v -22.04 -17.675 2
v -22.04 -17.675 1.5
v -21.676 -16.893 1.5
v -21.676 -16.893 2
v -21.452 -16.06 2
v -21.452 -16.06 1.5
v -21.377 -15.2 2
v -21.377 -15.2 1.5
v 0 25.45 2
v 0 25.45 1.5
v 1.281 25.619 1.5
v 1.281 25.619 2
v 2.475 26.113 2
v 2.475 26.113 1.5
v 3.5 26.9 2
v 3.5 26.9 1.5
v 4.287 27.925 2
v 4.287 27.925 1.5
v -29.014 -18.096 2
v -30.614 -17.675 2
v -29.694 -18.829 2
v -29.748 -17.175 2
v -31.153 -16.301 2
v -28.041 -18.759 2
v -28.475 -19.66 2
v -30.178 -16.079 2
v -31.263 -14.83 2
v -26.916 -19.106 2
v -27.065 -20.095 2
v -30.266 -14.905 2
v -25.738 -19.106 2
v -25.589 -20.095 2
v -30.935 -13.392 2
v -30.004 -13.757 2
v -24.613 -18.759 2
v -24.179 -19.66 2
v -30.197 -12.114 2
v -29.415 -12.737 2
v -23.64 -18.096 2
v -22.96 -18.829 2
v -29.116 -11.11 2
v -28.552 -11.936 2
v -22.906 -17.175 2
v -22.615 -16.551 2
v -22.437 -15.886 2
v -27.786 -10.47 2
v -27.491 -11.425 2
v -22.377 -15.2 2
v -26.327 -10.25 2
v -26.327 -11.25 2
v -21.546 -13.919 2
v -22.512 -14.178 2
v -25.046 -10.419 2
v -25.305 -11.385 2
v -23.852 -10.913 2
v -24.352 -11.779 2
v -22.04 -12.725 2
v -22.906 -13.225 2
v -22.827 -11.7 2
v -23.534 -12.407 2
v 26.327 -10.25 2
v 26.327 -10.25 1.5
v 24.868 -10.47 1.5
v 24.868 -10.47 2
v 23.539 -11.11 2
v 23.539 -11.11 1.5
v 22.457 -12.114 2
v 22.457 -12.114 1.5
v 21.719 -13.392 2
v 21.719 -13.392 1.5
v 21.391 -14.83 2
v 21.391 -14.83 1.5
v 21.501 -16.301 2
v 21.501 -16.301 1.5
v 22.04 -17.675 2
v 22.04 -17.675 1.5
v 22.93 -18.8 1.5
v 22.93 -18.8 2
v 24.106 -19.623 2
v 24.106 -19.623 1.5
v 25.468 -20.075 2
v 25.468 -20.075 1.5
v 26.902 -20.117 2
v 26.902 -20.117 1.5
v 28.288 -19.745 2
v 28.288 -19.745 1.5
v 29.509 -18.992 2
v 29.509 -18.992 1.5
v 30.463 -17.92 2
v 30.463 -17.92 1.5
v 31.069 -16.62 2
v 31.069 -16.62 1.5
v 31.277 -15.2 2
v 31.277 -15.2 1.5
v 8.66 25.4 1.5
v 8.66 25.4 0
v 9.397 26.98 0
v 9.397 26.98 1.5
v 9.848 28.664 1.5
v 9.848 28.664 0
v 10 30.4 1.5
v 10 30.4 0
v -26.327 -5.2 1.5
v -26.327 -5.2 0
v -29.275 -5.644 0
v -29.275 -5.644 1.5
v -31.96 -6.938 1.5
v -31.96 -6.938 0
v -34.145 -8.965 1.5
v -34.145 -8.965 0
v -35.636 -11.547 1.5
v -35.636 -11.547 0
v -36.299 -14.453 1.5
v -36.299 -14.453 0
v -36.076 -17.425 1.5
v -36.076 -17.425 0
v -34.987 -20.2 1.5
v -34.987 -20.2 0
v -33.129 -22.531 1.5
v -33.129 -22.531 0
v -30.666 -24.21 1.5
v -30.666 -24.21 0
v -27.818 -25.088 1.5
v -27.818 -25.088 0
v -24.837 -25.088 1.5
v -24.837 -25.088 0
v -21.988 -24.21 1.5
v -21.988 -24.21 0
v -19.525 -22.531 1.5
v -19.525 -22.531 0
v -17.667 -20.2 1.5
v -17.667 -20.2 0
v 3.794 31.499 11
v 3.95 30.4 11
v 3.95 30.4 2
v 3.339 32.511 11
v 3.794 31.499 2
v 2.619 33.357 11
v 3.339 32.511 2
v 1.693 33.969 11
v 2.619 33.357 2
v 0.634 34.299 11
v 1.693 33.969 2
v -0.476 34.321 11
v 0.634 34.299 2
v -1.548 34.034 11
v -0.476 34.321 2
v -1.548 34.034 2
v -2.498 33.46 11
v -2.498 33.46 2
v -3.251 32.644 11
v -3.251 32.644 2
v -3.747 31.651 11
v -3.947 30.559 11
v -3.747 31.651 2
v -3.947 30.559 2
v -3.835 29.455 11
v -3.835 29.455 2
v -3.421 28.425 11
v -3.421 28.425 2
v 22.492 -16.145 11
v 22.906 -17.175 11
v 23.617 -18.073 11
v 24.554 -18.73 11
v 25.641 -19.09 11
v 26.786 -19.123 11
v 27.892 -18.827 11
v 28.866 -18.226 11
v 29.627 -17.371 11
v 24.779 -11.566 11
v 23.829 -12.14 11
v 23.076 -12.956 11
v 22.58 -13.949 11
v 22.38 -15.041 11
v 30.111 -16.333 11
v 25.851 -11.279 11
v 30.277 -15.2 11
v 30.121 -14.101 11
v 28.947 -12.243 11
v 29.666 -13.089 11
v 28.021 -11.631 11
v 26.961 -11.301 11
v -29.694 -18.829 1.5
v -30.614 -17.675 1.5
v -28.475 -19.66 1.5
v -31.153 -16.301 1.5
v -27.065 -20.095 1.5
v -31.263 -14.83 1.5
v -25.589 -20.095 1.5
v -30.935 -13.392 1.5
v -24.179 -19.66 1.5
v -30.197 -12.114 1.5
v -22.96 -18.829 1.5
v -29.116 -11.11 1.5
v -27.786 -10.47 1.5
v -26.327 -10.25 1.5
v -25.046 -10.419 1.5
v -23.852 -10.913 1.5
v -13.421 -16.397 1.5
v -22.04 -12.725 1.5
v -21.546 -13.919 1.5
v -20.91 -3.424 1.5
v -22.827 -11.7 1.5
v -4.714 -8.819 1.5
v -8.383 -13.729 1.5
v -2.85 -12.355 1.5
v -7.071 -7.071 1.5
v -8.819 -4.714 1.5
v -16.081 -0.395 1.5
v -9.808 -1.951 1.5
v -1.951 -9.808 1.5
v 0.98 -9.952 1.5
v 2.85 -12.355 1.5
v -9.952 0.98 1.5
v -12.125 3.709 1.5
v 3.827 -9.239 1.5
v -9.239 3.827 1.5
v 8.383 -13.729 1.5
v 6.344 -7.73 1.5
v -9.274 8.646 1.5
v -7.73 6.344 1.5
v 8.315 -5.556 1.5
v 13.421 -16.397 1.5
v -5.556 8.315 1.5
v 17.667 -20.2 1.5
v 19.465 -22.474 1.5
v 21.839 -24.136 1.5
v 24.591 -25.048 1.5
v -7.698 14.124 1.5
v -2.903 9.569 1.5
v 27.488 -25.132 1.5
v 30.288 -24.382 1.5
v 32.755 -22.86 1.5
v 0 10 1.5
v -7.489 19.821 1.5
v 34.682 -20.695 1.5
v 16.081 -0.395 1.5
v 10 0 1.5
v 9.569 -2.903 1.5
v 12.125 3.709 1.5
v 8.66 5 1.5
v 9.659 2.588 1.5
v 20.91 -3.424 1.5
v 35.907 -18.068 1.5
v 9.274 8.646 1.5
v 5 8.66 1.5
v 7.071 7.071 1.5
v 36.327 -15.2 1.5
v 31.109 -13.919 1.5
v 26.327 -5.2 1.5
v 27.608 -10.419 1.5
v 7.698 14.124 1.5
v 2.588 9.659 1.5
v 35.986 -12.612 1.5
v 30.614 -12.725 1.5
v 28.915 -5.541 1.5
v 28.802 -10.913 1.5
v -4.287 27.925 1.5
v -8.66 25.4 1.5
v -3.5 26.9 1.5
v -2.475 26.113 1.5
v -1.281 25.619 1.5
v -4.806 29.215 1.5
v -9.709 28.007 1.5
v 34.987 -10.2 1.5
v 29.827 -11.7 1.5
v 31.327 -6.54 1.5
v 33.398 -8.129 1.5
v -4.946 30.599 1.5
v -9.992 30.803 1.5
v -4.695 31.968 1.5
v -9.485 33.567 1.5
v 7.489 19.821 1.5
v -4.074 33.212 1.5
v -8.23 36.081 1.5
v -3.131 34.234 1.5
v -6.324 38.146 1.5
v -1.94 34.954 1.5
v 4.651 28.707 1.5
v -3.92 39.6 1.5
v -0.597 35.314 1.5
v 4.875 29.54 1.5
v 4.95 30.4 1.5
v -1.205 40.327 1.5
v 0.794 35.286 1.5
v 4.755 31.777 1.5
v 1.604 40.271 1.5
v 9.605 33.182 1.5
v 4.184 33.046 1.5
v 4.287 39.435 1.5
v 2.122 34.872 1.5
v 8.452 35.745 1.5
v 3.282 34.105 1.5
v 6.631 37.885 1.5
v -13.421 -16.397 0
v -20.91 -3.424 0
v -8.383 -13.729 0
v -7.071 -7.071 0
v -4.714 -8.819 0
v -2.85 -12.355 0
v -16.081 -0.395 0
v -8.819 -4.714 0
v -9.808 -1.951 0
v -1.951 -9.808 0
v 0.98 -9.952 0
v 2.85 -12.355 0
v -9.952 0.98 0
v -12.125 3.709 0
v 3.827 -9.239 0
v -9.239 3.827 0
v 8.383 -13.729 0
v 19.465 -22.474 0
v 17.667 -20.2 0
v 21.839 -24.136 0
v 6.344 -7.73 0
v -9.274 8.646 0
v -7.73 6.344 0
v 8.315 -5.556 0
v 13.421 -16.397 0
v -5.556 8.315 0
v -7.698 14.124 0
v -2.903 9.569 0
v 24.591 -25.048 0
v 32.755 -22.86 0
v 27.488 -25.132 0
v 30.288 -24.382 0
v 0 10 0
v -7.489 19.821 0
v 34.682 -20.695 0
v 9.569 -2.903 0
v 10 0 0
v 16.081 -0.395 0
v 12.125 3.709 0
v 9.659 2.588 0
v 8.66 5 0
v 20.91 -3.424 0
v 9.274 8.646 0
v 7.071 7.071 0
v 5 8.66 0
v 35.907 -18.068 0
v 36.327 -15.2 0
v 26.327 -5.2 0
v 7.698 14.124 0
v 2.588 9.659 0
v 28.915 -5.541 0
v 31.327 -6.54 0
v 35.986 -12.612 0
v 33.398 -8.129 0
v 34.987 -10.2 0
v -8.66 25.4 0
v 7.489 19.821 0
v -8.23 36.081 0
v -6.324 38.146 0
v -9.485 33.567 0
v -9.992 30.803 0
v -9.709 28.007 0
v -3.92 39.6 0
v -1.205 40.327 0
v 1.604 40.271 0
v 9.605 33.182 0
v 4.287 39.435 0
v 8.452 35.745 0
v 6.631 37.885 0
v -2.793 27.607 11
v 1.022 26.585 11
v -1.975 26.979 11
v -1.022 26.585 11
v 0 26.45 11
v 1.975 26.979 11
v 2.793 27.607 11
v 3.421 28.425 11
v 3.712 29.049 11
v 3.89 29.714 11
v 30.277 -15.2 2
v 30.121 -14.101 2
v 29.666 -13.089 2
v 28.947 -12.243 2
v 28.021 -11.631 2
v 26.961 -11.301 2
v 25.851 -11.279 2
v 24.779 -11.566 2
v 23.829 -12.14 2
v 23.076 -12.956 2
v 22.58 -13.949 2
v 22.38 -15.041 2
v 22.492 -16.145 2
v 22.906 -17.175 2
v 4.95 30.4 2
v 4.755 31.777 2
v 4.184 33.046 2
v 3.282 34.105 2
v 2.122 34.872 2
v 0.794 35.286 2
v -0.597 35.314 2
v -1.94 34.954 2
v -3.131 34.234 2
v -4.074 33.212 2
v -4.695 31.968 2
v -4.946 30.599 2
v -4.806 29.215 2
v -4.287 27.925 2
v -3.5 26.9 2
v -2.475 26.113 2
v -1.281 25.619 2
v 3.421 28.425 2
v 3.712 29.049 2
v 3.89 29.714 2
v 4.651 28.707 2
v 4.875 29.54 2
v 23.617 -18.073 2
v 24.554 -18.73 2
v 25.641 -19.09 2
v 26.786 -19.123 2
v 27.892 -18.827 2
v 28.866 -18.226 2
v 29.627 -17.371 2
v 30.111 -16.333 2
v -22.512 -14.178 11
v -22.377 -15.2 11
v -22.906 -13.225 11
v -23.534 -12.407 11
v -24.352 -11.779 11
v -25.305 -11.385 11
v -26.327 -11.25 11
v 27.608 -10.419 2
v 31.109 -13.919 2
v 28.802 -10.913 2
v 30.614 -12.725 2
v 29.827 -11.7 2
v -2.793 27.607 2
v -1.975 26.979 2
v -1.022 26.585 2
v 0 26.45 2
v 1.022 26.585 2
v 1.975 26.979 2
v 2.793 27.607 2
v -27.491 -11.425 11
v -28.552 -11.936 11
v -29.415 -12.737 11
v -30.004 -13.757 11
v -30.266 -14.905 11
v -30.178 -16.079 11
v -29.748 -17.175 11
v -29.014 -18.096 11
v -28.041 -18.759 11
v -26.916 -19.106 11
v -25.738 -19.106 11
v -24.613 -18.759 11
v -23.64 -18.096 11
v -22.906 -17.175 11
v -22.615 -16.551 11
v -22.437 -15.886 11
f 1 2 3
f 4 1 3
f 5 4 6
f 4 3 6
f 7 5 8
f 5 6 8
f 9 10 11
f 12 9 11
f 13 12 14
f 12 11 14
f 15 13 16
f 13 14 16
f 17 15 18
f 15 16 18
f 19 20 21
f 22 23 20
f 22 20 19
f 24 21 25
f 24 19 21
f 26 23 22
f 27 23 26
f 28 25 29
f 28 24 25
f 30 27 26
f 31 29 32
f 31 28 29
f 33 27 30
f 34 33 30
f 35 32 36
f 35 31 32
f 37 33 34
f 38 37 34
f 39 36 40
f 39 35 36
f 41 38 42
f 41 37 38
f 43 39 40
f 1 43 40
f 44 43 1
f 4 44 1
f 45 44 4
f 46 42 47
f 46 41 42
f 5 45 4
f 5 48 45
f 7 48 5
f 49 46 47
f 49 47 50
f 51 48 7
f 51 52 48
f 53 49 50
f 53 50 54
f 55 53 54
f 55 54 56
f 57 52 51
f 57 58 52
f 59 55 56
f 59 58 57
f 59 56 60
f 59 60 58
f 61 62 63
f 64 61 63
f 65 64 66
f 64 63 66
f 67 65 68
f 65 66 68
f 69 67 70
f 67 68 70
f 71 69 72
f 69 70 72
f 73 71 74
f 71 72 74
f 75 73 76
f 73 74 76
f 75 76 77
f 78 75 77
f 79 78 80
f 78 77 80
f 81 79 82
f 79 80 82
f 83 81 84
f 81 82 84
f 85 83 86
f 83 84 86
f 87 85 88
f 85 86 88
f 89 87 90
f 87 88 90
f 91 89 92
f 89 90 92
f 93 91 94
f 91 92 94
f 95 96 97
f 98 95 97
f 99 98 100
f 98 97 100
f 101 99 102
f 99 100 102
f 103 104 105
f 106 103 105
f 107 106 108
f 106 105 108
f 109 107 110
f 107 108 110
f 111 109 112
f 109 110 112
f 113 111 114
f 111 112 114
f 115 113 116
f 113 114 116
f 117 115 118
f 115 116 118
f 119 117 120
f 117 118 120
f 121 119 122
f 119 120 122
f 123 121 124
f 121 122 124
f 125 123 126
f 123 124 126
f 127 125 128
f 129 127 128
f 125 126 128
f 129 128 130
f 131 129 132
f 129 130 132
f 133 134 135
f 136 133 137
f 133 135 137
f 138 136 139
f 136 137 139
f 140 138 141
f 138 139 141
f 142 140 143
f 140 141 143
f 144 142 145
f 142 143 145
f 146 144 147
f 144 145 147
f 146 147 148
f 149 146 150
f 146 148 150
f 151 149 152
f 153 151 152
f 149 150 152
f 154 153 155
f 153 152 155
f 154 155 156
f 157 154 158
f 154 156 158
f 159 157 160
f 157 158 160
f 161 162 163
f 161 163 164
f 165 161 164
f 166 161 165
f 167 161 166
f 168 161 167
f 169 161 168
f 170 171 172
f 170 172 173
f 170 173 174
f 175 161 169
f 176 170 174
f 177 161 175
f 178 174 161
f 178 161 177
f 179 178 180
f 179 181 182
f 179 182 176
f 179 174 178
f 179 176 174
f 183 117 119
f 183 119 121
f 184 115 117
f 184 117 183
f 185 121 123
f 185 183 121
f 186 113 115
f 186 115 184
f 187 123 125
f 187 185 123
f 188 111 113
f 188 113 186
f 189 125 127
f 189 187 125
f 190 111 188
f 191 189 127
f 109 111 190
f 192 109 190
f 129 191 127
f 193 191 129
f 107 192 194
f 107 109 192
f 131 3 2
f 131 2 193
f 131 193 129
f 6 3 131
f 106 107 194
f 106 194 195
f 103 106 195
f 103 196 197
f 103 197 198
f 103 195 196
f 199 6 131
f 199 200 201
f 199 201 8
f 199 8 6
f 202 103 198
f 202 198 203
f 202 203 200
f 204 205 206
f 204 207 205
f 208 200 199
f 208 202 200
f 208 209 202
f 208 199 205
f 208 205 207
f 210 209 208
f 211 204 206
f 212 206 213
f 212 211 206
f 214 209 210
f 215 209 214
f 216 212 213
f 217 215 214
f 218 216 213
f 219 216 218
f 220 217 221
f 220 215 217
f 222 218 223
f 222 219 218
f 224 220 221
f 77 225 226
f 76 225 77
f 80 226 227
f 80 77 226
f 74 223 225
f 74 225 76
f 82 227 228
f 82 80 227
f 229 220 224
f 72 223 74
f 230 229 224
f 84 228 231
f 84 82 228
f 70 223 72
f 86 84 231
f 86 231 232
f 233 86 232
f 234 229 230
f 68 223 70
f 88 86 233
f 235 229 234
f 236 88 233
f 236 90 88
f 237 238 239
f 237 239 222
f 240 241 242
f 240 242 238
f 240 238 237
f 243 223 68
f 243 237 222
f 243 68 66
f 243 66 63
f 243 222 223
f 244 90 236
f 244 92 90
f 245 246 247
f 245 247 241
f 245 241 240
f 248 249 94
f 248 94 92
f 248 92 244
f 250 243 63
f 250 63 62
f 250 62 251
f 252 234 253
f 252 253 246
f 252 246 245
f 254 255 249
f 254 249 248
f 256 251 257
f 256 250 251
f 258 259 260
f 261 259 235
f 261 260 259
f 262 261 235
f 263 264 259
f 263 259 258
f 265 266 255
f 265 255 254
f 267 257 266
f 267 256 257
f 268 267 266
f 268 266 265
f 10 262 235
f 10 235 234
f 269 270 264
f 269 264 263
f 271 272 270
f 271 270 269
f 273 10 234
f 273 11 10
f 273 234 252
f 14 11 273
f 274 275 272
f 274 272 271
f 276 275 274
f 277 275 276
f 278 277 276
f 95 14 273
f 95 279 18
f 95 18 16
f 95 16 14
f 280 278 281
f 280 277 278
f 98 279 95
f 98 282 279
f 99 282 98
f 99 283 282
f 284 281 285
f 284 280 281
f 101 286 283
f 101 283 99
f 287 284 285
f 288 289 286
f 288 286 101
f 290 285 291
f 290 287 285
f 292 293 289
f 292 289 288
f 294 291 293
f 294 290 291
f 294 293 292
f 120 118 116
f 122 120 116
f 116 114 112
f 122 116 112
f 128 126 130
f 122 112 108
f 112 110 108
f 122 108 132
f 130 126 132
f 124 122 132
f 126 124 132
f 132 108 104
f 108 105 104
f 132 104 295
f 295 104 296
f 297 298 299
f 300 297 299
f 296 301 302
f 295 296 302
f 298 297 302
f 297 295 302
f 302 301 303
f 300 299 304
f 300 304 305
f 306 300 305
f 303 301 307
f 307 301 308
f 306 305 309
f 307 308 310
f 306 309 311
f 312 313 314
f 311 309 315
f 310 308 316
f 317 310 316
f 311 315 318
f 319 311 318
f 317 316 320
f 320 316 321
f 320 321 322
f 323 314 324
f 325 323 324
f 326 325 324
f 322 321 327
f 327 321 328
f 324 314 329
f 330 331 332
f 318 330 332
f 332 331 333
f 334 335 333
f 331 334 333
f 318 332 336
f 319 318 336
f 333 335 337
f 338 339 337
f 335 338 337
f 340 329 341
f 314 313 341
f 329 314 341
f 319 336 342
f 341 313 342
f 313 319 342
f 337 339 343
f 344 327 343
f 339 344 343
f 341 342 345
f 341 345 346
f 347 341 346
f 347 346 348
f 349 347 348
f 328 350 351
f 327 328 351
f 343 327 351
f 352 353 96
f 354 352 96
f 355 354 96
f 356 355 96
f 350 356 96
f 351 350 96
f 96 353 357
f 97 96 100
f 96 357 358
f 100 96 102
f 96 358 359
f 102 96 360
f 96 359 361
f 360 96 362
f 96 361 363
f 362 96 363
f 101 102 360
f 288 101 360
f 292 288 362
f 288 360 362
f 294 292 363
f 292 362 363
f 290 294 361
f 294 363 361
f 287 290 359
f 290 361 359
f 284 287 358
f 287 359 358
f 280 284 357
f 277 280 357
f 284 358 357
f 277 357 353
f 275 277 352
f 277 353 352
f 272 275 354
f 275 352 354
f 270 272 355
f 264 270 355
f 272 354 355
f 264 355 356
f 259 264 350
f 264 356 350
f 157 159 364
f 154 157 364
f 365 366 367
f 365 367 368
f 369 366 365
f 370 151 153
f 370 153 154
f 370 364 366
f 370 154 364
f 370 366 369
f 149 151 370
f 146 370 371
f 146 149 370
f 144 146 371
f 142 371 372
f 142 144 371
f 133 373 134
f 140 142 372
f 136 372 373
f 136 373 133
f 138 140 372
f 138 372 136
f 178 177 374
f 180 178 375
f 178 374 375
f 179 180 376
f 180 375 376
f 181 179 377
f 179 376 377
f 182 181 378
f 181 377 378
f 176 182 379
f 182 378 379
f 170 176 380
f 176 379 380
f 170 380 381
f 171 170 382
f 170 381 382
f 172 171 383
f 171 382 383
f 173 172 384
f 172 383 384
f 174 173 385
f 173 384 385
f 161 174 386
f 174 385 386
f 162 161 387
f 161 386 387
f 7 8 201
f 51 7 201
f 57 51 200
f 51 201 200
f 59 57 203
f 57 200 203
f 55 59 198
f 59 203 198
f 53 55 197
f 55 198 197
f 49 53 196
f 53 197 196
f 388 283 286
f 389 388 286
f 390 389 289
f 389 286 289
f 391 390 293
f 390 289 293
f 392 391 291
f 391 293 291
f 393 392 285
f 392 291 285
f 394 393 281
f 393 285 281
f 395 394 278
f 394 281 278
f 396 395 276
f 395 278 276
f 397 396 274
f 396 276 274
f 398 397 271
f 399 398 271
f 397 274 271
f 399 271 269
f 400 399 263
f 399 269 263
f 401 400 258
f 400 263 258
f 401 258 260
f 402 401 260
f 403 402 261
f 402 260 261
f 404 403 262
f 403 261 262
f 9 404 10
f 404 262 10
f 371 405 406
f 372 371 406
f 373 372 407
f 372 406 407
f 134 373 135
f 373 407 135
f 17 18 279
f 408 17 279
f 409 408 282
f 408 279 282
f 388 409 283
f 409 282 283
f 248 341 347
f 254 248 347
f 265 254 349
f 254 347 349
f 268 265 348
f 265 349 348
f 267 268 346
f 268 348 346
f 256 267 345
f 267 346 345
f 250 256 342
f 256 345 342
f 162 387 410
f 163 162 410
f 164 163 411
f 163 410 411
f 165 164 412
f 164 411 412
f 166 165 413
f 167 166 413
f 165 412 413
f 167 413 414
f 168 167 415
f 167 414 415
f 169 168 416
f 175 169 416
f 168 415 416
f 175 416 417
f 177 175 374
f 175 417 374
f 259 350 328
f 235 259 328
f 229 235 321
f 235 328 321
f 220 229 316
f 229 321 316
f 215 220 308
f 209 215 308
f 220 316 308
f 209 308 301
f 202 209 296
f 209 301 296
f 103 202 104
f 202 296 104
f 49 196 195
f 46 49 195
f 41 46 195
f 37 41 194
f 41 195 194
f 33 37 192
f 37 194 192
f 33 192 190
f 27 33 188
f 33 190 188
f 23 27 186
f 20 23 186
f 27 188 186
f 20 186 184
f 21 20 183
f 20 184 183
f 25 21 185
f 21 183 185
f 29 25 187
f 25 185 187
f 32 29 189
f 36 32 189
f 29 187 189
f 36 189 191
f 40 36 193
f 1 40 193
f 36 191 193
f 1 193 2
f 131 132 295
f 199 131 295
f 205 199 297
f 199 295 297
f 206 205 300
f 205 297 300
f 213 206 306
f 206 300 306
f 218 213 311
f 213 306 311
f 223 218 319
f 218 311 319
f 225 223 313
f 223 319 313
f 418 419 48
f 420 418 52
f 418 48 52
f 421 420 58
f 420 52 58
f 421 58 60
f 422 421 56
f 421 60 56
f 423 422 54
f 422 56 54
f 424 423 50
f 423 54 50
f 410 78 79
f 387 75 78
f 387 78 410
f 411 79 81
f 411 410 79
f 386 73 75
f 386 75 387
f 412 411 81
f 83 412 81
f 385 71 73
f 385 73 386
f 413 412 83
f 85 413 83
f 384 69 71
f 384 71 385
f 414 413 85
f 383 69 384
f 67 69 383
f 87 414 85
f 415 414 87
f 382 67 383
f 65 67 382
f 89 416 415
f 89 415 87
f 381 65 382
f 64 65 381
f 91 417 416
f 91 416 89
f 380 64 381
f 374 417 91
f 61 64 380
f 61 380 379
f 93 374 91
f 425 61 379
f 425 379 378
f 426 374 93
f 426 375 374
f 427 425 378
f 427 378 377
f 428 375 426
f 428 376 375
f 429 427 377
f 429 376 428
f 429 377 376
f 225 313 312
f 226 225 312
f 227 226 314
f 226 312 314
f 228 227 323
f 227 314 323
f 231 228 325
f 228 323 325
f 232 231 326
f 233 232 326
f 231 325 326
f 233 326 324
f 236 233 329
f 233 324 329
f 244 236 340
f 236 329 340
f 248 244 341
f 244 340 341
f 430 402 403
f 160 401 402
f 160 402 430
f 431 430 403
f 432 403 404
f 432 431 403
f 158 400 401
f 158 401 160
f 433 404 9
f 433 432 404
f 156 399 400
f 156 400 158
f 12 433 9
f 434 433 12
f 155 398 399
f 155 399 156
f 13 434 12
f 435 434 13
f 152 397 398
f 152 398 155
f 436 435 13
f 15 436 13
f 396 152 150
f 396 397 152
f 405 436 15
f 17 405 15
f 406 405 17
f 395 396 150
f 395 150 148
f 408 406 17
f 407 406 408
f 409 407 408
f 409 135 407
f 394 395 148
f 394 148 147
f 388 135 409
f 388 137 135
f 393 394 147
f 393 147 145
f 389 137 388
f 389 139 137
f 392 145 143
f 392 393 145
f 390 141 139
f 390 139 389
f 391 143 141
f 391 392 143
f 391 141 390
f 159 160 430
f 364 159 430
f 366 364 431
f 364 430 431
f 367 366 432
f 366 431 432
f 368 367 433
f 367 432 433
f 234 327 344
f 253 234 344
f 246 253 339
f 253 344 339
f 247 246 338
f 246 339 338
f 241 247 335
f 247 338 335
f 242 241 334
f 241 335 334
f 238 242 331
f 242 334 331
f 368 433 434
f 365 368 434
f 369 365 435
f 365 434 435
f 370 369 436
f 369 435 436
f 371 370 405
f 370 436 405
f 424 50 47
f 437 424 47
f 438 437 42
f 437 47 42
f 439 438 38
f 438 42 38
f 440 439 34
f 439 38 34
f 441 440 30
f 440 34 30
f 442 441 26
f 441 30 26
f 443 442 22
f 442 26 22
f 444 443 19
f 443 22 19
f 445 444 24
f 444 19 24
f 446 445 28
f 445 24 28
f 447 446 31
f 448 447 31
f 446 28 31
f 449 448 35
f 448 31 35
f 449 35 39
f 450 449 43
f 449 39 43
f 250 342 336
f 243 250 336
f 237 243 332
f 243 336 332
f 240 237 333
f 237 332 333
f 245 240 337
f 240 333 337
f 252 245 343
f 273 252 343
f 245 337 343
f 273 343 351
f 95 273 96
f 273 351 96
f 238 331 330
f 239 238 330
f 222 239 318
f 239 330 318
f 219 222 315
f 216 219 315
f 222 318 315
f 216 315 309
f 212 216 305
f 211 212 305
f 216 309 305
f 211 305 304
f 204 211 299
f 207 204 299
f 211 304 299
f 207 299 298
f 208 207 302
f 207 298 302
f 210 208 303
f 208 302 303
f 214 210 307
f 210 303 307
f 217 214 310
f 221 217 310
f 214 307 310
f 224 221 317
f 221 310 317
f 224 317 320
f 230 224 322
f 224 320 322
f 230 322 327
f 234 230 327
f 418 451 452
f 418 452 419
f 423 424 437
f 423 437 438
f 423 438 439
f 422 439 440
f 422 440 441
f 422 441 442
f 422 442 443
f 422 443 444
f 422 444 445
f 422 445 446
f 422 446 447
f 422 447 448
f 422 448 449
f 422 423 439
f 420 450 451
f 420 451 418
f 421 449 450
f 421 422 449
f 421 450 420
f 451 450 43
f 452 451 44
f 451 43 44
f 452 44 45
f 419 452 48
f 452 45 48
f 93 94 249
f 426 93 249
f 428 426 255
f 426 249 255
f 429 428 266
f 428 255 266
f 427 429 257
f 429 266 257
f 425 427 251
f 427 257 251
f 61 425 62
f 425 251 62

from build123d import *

# Parameters (mm, degrees)
F1_DEPTH = 1.5
F2_DEPTH = 2
F3_DEPTH = 11


with BuildPart() as f1:
    # F0 (on Top) → F1 (new body)
    with BuildSketch(Plane.XY):
        with BuildLine():
            ThreePointArc((10, 30.4), (-2.588190451, 40.0592582629), (-8.6602540378, 25.4))
            Line((-8.6602540378, 25.4), (-4.2868257487, 27.925))
            ThreePointArc((-4.2868257487, 27.925), (-1.2811542733, 35.1813328401), (4.95, 30.4))
            ThreePointArc((4.95, 30.4), (4.7813328401, 29.1188457267), (4.2868257487, 27.925))
            Line((4.2868257487, 27.925), (8.6602540378, 25.4))
            ThreePointArc((8.6602540378, 25.4), (9.6592582629, 27.811809549), (10, 30.4))
        make_face()
        with BuildLine():
            Line((0, 25.45), (0, 20.4))
            ThreePointArc((0, 20.4), (5, 21.7397459622), (8.6602540378, 25.4))
            Line((8.6602540378, 25.4), (4.2868257487, 27.925))
            ThreePointArc((4.2868257487, 27.925), (2.475, 26.1131742513), (0, 25.45))
        make_face()
        with BuildLine():
            ThreePointArc((-8.6602540378, 25.4), (-5, 21.7397459622), (0, 20.4))
            Line((0, 20.4), (0, 25.45))
            ThreePointArc((0, 25.45), (-2.475, 26.1131742513), (-4.2868257487, 27.925))
            Line((-4.2868257487, 27.925), (-8.6602540378, 25.4))
        make_face()
        with BuildLine():
            ThreePointArc((8.6602540378, 25.4), (5, 21.7397459622), (0, 20.4))
            ThreePointArc((0, 20.4), (-5, 21.7397459622), (-8.6602540378, 25.4))
            ThreePointArc((-8.6602540378, 25.4), (-10.5489683598, 6.0904497222), (-26.327172275, -5.2))
            ThreePointArc((-26.327172275, -5.2), (-19.2561044632, -8.1289321881), (-16.327172275, -15.2))
            ThreePointArc((-16.327172275, -15.2), (-16.6679140122, -17.788190451), (-17.6669182372, -20.2))
            ThreePointArc((-17.6669182372, -20.2), (0, -12.1808994444), (17.6669182372, -20.2))
            ThreePointArc((17.6669182372, -20.2), (17.6669182372, -10.2), (26.327172275, -5.2))
            ThreePointArc((26.327172275, -5.2), (10.5489683598, 6.0904497222), (8.6602540378, 25.4))
        make_face()
        with BuildLine():
            ThreePointArc((0, 10), (7.0710678119, 7.0710678119), (10, 0))
            ThreePointArc((10, 0), (-7.0710678119, -7.0710678119), (0, 10))
        make_face(mode=Mode.SUBTRACT)
        with BuildLine():
            ThreePointArc((-16.327172275, -15.2), (-19.2561044632, -8.1289321881), (-26.327172275, -5.2))
            Line((-26.327172275, -5.2), (-26.327172275, -10.25))
            ThreePointArc((-26.327172275, -10.25), (-22.8269937082, -11.6998214331), (-21.377172275, -15.2))
            ThreePointArc((-21.377172275, -15.2), (-21.5458394349, -16.4811542733), (-22.0403465263, -17.675))
            Line((-22.0403465263, -17.675), (-17.6669182372, -20.2))
            ThreePointArc((-17.6669182372, -20.2), (-16.6679140122, -17.788190451), (-16.327172275, -15.2))
        make_face()
        with BuildLine():
            Line((-26.327172275, -10.25), (-26.327172275, -5.2))
            ThreePointArc((-26.327172275, -5.2), (-34.9874263129, -20.2), (-17.6669182372, -20.2))
            Line((-17.6669182372, -20.2), (-22.0403465263, -17.675))
            ThreePointArc((-22.0403465263, -17.675), (-30.6139980238, -17.675), (-26.327172275, -10.25))
        make_face()
        with BuildLine():
            ThreePointArc((36.327172275, -15.2), (33.3982400869, -8.1289321881), (26.327172275, -5.2))
            Line((26.327172275, -5.2), (26.327172275, -10.25))
            ThreePointArc((26.327172275, -10.25), (29.8273508419, -11.6998214331), (31.277172275, -15.2))
            ThreePointArc((31.277172275, -15.2), (27.6083265483, -19.9813328401), (22.0403465263, -17.675))
            Line((22.0403465263, -17.675), (17.6669182372, -20.2))
            ThreePointArc((17.6669182372, -20.2), (28.9153627261, -24.8592582629), (36.327172275, -15.2))
        make_face()
        with BuildLine():
            Line((26.327172275, -10.25), (26.327172275, -5.2))
            ThreePointArc((26.327172275, -5.2), (17.6669182372, -10.2), (17.6669182372, -20.2))
            Line((17.6669182372, -20.2), (22.0403465263, -17.675))
            ThreePointArc((22.0403465263, -17.675), (22.0403465263, -12.725), (26.327172275, -10.25))
        make_face()
    extrude(amount=F1_DEPTH)

    # F0 (on Top) → F2 (join)
    with BuildSketch(Plane.XY):
        with BuildLine():
            ThreePointArc((4.95, 30.4), (-1.2811542733, 35.1813328401), (-4.2868257487, 27.925))
            Line((-4.2868257487, 27.925), (-3.4208003449, 28.425))
            ThreePointArc((-3.4208003449, 28.425), (-1.0223352282, 34.2154070138), (3.95, 30.4))
            ThreePointArc((3.95, 30.4), (3.8154070138, 29.3776647718), (3.4208003449, 28.425))
            Line((3.4208003449, 28.425), (4.2868257487, 27.925))
            ThreePointArc((4.2868257487, 27.925), (4.7813328401, 29.1188457267), (4.95, 30.4))
        make_face()
        with BuildLine():
            ThreePointArc((-4.2868257487, 27.925), (-2.475, 26.1131742513), (0, 25.45))
            Line((0, 25.45), (0, 26.45))
            ThreePointArc((0, 26.45), (-1.975, 26.9791996551), (-3.4208003449, 28.425))
            Line((-3.4208003449, 28.425), (-4.2868257487, 27.925))
        make_face()
        with BuildLine():
            Line((0, 26.45), (0, 25.45))
            ThreePointArc((0, 25.45), (2.475, 26.1131742513), (4.2868257487, 27.925))
            Line((4.2868257487, 27.925), (3.4208003449, 28.425))
            ThreePointArc((3.4208003449, 28.425), (1.975, 26.9791996551), (0, 26.45))
        make_face()
        with BuildLine():
            Line((26.327172275, -11.25), (26.327172275, -10.25))
            ThreePointArc((26.327172275, -10.25), (22.0403465263, -12.725), (22.0403465263, -17.675))
            Line((22.0403465263, -17.675), (22.9063719301, -17.175))
            ThreePointArc((22.9063719301, -17.175), (22.9063719301, -13.225), (26.327172275, -11.25))
        make_face()
        with BuildLine():
            ThreePointArc((31.277172275, -15.2), (29.8273508419, -11.6998214331), (26.327172275, -10.25))
            Line((26.327172275, -10.25), (26.327172275, -11.25))
            ThreePointArc((26.327172275, -11.25), (29.1202440607, -12.4069282143), (30.277172275, -15.2))
            ThreePointArc((30.277172275, -15.2), (27.3495075032, -19.0154070138), (22.9063719301, -17.175))
            Line((22.9063719301, -17.175), (22.0403465263, -17.675))
            ThreePointArc((22.0403465263, -17.675), (27.6083265483, -19.9813328401), (31.277172275, -15.2))
        make_face()
        with BuildLine():
            Line((-26.327172275, -11.25), (-26.327172275, -10.25))
            ThreePointArc((-26.327172275, -10.25), (-30.6139980238, -17.675), (-22.0403465263, -17.675))
            Line((-22.0403465263, -17.675), (-22.9063719301, -17.175))
            ThreePointArc((-22.9063719301, -17.175), (-29.74797262, -17.175), (-26.327172275, -11.25))
        make_face()
        with BuildLine():
            ThreePointArc((-21.377172275, -15.2), (-22.8269937082, -11.6998214331), (-26.327172275, -10.25))
            Line((-26.327172275, -10.25), (-26.327172275, -11.25))
            ThreePointArc((-26.327172275, -11.25), (-23.5341004894, -12.4069282143), (-22.377172275, -15.2))
            ThreePointArc((-22.377172275, -15.2), (-22.5117652612, -16.2223352282), (-22.9063719301, -17.175))
            Line((-22.9063719301, -17.175), (-22.0403465263, -17.675))
            ThreePointArc((-22.0403465263, -17.675), (-21.5458394349, -16.4811542733), (-21.377172275, -15.2))
        make_face()
    extrude(amount=F2_DEPTH)

    # F0 (on Top) → F3 (join)
    with BuildSketch(Plane.XY):
        with BuildLine():
            Line((-3.4208003449, 28.425), (0, 30.4))
            Line((0, 30.4), (3.4208003449, 28.425))
            ThreePointArc((3.4208003449, 28.425), (3.8154070138, 29.3776647718), (3.95, 30.4))
            ThreePointArc((3.95, 30.4), (-1.0223352282, 34.2154070138), (-3.4208003449, 28.425))
        make_face()
        with BuildLine():
            ThreePointArc((-3.4208003449, 28.425), (-1.975, 26.9791996551), (0, 26.45))
            Line((0, 26.45), (0, 30.4))
            Line((0, 30.4), (-3.4208003449, 28.425))
        make_face()
        with BuildLine():
            Line((0, 30.4), (0, 26.45))
            ThreePointArc((0, 26.45), (1.975, 26.9791996551), (3.4208003449, 28.425))
            Line((3.4208003449, 28.425), (0, 30.4))
        make_face()
        with BuildLine():
            ThreePointArc((-22.377172275, -15.2), (-23.5341004894, -12.4069282143), (-26.327172275, -11.25))
            Line((-26.327172275, -11.25), (-26.327172275, -15.2))
            Line((-26.327172275, -15.2), (-22.9063719301, -17.175))
            ThreePointArc((-22.9063719301, -17.175), (-22.5117652612, -16.2223352282), (-22.377172275, -15.2))
        make_face()
        with BuildLine():
            Line((-26.327172275, -15.2), (-26.327172275, -11.25))
            ThreePointArc((-26.327172275, -11.25), (-29.74797262, -17.175), (-22.9063719301, -17.175))
            Line((-22.9063719301, -17.175), (-26.327172275, -15.2))
        make_face()
        with BuildLine():
            Line((26.327172275, -15.2), (26.327172275, -11.25))
            ThreePointArc((26.327172275, -11.25), (22.9063719301, -13.225), (22.9063719301, -17.175))
            Line((22.9063719301, -17.175), (26.327172275, -15.2))
        make_face()
        with BuildLine():
            ThreePointArc((30.277172275, -15.2), (29.1202440607, -12.4069282143), (26.327172275, -11.25))
            Line((26.327172275, -11.25), (26.327172275, -15.2))
            Line((26.327172275, -15.2), (22.9063719301, -17.175))
            ThreePointArc((22.9063719301, -17.175), (27.3495075032, -19.0154070138), (30.277172275, -15.2))
        make_face()
    extrude(amount=F3_DEPTH)


solid = f1.part
